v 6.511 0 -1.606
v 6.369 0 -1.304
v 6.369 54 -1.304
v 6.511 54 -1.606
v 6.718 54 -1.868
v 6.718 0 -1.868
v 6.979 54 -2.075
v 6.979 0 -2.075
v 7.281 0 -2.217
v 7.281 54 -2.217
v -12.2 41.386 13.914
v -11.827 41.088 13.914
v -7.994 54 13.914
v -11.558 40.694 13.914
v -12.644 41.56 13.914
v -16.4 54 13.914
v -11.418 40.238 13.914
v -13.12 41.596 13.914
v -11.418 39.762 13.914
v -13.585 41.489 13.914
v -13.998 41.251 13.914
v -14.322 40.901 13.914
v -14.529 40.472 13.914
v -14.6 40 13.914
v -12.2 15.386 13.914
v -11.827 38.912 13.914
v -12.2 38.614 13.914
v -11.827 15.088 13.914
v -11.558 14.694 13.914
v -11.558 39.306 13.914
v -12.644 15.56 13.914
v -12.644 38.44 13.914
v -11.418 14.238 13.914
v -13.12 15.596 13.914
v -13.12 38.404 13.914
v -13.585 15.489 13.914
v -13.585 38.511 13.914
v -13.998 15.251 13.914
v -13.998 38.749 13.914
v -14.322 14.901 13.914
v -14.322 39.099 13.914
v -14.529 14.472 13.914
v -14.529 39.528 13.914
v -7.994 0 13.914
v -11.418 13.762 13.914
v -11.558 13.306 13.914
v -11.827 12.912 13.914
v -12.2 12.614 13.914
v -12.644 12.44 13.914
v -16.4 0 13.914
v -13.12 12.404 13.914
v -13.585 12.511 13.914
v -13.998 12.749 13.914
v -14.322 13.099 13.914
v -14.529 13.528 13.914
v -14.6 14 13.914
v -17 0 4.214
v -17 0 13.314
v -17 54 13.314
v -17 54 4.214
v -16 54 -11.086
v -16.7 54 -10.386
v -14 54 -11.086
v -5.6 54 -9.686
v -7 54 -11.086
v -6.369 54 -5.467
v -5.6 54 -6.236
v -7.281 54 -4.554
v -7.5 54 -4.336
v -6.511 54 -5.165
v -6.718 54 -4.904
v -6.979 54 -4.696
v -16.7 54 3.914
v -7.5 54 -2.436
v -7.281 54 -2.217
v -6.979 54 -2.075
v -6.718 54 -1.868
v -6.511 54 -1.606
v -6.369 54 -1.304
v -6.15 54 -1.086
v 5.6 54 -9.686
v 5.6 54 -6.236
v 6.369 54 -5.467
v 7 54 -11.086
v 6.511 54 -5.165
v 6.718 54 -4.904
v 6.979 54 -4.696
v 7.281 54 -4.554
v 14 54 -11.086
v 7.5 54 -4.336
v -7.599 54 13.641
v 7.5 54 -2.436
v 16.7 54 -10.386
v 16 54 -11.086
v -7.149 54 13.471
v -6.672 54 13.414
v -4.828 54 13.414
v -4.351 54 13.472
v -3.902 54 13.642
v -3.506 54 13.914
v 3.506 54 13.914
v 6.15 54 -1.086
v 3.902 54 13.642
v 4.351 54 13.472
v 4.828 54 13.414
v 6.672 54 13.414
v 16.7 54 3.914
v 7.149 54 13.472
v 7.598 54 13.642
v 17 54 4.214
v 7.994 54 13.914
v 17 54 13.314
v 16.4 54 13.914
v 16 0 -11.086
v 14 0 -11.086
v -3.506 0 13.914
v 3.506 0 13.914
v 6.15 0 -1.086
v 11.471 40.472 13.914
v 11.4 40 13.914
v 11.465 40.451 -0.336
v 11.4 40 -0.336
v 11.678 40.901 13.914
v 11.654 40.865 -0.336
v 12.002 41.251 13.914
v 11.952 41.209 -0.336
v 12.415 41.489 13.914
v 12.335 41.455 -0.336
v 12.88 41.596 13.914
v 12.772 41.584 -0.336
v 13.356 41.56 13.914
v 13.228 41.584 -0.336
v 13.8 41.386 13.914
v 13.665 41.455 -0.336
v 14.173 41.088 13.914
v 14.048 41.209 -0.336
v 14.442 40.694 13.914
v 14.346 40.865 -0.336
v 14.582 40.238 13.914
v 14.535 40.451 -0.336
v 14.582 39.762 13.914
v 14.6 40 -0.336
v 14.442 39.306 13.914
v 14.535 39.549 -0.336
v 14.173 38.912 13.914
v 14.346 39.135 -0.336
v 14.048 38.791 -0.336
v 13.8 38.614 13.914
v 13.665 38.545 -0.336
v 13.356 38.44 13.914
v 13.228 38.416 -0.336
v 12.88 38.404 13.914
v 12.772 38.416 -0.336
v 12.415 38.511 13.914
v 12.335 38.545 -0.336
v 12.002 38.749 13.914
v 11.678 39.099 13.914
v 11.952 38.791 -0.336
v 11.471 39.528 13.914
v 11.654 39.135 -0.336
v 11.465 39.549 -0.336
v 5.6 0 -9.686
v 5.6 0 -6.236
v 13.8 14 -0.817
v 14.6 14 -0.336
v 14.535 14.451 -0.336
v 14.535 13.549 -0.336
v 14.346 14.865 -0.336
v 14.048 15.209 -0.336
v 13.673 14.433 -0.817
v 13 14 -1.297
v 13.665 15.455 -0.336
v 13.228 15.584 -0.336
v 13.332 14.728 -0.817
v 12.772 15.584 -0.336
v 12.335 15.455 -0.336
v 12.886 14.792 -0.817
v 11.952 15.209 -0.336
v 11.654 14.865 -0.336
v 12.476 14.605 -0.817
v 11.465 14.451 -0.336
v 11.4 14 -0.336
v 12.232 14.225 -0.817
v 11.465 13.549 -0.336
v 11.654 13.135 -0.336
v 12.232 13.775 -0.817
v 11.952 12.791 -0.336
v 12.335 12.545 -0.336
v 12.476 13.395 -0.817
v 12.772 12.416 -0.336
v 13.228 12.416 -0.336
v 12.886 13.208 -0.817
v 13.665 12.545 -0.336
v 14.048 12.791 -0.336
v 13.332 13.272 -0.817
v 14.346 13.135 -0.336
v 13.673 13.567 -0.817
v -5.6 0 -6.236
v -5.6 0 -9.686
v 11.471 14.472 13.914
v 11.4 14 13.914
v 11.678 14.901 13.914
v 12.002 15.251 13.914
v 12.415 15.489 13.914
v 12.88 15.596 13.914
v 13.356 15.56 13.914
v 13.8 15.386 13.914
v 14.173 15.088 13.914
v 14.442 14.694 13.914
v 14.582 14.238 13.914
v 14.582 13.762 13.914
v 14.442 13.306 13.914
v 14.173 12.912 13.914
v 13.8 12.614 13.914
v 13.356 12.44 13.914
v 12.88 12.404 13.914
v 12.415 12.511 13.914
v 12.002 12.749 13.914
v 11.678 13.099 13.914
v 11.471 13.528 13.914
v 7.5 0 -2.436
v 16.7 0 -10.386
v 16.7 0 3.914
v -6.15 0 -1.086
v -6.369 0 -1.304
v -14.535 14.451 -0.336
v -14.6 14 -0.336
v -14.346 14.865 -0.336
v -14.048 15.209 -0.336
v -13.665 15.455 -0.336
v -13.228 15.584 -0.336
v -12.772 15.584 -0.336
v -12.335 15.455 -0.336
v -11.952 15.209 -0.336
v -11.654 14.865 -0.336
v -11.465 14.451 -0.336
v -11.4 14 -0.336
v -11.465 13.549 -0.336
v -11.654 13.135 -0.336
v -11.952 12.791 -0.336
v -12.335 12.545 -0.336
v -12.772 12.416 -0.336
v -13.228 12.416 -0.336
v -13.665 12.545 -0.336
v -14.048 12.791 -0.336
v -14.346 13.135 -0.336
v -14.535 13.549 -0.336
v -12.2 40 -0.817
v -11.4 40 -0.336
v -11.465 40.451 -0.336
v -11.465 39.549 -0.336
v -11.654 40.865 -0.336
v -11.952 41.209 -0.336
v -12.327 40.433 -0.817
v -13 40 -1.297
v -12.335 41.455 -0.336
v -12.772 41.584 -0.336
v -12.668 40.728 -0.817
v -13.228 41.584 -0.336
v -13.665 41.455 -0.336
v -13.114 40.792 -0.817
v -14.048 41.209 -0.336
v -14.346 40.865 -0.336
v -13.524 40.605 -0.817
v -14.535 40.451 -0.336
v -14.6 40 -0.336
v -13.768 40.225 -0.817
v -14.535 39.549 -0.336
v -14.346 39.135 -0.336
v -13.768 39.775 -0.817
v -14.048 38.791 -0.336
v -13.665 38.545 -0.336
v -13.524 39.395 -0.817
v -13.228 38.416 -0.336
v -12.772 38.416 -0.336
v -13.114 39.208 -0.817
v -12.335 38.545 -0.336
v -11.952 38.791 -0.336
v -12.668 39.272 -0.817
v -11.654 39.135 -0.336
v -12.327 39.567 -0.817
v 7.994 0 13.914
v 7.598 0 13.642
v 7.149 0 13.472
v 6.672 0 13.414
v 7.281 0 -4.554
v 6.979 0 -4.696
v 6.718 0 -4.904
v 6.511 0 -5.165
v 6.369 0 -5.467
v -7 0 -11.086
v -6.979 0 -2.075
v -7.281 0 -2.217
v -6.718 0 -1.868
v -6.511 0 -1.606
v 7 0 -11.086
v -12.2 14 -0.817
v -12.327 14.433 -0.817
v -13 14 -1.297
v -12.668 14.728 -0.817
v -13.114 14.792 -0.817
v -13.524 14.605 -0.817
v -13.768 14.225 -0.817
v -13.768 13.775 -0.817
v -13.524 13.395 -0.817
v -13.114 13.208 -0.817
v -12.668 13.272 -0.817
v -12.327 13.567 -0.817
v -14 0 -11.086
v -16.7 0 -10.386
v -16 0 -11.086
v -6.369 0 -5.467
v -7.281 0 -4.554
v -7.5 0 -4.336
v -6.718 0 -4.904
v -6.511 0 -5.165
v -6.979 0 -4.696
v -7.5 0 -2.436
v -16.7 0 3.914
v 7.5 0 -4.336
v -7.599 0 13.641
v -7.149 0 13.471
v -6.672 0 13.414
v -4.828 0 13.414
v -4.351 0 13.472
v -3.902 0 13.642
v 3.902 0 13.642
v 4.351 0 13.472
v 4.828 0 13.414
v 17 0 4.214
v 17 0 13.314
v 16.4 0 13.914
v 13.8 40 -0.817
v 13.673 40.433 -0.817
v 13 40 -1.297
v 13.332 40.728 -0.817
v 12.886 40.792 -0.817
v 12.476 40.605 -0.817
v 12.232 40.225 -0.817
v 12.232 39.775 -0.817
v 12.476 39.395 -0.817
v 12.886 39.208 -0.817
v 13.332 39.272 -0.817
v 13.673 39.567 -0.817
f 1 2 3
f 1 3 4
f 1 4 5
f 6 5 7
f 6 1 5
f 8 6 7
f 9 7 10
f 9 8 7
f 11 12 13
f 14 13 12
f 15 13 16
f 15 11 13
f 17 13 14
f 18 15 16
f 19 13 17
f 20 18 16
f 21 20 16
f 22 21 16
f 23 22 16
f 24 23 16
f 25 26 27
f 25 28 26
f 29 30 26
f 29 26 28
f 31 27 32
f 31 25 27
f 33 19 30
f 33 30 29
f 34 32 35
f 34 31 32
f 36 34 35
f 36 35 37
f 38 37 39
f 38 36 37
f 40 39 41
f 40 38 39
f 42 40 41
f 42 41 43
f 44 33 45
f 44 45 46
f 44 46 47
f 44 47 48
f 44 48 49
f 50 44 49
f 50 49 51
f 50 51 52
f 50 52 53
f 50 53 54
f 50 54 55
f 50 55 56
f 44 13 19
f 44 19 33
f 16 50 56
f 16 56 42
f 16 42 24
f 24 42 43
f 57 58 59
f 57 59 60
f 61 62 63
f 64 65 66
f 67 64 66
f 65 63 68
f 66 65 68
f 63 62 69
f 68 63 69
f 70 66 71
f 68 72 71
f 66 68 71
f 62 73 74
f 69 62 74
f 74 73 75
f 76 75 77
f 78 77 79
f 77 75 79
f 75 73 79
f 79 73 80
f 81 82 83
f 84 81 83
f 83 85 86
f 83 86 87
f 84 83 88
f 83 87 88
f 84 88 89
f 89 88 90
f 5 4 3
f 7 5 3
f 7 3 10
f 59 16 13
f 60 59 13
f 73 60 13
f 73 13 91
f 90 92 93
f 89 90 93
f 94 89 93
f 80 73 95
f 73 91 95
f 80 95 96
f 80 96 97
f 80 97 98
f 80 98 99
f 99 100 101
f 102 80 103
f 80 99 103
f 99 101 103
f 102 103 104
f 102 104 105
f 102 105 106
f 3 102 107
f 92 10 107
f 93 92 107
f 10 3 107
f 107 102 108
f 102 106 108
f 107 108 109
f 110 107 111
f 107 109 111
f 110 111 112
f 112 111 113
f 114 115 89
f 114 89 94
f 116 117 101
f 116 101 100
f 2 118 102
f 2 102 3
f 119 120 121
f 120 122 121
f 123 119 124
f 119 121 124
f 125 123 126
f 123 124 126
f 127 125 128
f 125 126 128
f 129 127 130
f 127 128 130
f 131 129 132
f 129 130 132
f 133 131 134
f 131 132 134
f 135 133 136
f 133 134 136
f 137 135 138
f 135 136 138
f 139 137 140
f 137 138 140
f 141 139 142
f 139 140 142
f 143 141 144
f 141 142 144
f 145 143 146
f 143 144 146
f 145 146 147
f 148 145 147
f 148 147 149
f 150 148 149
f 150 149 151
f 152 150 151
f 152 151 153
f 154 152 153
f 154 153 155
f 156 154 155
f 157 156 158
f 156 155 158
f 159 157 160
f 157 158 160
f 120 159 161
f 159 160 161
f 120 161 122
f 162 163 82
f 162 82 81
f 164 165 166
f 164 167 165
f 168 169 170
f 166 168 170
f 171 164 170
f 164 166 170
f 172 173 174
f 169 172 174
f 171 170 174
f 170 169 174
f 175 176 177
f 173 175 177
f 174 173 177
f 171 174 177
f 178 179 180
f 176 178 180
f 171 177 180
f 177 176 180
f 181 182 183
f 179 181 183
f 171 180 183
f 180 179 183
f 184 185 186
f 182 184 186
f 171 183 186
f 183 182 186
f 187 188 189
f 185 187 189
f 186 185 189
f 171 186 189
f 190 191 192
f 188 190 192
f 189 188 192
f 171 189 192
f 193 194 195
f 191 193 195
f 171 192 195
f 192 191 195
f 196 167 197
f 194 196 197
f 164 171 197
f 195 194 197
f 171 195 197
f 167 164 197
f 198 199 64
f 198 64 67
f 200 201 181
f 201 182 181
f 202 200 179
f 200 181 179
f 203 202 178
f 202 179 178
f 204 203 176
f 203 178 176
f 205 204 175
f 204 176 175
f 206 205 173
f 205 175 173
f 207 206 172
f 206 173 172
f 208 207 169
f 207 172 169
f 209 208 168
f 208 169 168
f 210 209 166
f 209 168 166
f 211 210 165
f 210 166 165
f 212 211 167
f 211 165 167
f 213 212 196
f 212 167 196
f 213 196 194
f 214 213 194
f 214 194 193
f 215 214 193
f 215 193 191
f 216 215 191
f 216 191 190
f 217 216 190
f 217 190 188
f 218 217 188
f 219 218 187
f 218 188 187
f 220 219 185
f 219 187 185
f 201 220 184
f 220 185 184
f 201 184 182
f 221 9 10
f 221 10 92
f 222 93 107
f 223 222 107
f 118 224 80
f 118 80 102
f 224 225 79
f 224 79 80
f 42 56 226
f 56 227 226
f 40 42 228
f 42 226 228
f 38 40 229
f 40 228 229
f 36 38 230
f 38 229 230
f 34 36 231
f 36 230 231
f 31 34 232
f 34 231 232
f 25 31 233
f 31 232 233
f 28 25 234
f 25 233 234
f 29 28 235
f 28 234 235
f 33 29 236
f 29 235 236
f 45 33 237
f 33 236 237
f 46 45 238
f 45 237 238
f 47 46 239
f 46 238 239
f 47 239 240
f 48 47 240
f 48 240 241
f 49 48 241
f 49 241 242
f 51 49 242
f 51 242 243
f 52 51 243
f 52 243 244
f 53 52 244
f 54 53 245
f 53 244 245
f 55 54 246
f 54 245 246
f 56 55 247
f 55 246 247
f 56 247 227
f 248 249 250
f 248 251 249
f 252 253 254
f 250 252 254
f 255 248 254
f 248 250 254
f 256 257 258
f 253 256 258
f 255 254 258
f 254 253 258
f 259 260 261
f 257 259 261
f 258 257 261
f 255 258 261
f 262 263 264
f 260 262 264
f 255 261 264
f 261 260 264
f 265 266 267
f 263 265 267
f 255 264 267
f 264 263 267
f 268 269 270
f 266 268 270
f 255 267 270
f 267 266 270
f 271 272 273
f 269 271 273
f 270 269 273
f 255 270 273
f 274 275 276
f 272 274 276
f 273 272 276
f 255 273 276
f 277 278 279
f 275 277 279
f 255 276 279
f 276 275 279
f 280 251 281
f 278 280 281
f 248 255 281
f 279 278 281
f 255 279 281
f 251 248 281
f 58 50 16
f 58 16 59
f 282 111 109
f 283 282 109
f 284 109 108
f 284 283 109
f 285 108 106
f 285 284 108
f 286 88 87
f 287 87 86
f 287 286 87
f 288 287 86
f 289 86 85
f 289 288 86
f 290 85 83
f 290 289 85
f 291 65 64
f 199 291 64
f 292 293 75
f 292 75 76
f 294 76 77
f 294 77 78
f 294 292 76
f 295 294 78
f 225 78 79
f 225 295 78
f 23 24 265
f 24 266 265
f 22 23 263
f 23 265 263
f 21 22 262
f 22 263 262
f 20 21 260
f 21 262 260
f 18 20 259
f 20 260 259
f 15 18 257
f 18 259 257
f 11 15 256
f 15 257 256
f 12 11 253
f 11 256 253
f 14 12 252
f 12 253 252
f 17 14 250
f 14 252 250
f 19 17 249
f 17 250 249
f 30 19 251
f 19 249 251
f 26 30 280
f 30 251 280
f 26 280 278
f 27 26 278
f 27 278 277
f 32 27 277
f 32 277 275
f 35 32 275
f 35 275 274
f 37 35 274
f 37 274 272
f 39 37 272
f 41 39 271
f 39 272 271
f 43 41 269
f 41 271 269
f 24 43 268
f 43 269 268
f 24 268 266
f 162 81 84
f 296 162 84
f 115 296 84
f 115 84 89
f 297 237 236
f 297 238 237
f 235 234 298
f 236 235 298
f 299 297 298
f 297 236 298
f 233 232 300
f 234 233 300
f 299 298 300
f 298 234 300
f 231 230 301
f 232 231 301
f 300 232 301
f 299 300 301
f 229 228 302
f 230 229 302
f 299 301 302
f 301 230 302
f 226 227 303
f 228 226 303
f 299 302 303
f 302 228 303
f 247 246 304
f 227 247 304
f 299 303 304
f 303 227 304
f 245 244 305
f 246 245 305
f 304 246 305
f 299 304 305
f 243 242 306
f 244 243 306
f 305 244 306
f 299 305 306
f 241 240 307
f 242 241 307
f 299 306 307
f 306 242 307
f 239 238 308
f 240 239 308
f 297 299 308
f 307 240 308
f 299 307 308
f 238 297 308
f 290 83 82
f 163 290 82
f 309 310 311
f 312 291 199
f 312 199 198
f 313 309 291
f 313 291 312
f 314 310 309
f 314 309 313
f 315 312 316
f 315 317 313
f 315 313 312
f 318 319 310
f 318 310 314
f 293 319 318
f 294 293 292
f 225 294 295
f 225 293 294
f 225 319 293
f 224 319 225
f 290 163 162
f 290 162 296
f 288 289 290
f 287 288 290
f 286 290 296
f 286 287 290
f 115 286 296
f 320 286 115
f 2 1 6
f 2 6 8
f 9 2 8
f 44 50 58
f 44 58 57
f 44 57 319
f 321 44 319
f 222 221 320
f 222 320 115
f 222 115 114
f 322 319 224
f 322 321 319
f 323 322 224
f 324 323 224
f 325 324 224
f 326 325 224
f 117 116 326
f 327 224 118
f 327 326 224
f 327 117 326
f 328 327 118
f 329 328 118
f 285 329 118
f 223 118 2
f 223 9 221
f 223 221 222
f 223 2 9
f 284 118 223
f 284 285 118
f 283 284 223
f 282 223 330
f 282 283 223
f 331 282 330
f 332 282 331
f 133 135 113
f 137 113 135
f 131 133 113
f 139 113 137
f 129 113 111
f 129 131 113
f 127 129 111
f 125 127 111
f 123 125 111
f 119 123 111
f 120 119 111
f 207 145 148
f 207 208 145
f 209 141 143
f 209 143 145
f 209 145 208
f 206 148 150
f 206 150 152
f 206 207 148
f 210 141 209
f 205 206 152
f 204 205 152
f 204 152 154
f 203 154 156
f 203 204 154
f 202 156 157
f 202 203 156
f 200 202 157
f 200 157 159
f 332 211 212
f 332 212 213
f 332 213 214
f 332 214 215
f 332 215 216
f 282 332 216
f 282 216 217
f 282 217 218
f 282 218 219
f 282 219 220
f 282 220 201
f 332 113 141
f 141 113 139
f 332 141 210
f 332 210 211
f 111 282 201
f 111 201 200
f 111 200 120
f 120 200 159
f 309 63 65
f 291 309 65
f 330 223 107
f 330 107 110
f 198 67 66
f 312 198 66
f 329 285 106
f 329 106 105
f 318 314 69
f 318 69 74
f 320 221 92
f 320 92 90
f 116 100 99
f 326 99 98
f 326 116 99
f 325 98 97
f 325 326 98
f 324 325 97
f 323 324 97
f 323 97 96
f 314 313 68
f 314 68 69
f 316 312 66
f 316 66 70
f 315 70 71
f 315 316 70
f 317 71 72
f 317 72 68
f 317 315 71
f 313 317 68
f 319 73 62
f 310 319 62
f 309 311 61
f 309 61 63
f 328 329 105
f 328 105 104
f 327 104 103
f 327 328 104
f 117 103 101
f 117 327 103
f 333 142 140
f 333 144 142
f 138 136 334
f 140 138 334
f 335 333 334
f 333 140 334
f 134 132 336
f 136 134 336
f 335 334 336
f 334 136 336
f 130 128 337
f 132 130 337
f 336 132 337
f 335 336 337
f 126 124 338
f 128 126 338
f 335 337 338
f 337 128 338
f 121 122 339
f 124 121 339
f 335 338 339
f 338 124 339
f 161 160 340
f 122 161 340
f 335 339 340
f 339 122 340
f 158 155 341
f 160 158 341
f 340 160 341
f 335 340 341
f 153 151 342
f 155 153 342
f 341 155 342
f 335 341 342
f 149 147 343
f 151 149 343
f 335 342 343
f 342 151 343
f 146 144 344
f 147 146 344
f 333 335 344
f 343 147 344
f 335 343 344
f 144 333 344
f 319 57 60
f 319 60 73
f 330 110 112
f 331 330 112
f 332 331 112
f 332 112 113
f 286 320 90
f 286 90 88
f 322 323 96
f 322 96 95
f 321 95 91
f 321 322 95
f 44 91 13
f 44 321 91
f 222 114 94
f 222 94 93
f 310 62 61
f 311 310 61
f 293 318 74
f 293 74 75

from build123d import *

# Parameters (mm, degrees)
F1_DEPTH = 54
F2_DEPTH = 54
F4_D     = 3.2
F4_DEPTH = 14.25
F4_TIP   = 0.9613769904


# Not quite as in the source:
# - ends of sketch curves that miss each other by under 0.0002 mm in the source are joined


with BuildPart() as f1:
    # F0 (on Front) → F1 (new body)
    with BuildSketch(Plane.XZ):
        with BuildLine():
            Line((-15.9999975914, -11.0858444687), (-13.9999981419, -11.0858444687))
            Line((-13.9999981419, -11.0858444687), (-14.9999975913, -10.0858455697))
            Line((-14.9999975913, -10.0858455697), (-14.9999975913, 8.4141544303))
            Line((-14.9999975913, 8.4141544303), (-13.9999975913, 9.4141544303))
            Line((-13.9999975913, 9.4141544303), (14.0000024087, 9.4141544303))
            Line((14.0000024087, 9.4141544303), (15.0000024087, 8.4141544303))
            Line((15.0000024087, 8.4141544303), (15.0000024087, -10.0858455697))
            Line((15.0000024087, -10.0858455697), (14.0000024087, -11.0858455697))
            Line((14.0000024087, -11.0858455697), (16.0000024087, -11.0858444685))
            Line((16.0000024087, -11.0858444685), (16.7000024086, -10.3858444685))
            Line((16.7000024086, -10.3858444685), (16.7000024087, 3.914155003))
            Line((16.7000024087, 3.914155003), (17.0000024087, 4.2141550029))
            Line((17.0000024087, 4.2141550029), (17.0000024088, 13.3141544304))
            Line((17.0000024088, 13.3141544304), (16.4000024089, 13.9141544303))
            Line((16.4000024089, 13.9141544303), (7.9944513482, 13.9141544304))
            ThreePointArc((7.9944513482, 13.9141544304), (7.3786811713, 13.5433235007), (6.671572232, 13.4141513784))
            Line((6.671572232, 13.4141513784), (4.8284325856, 13.4141513784))
            ThreePointArc((4.8284325856, 13.4141513784), (4.1213236463, 13.5433235007), (3.5055534694, 13.9141544304))
            Line((3.5055534694, 13.9141544304), (-3.5055486519, 13.9141544303))
            ThreePointArc((-3.5055486519, 13.9141544303), (-4.1213188288, 13.5433235006), (-4.828427768, 13.4141513784))
            Line((-4.828427768, 13.4141513784), (-6.6715674144, 13.4141513784))
            ThreePointArc((-6.6715674144, 13.4141513784), (-7.3788732943, 13.5428024468), (-7.9944465306, 13.9141544304))
            Line((-7.9944465306, 13.9141544304), (-16.3999975914, 13.9141544303))
            Line((-16.3999975914, 13.9141544303), (-16.9999975913, 13.3141544304))
            Line((-16.9999975913, 13.3141544304), (-16.9999975913, 4.2141550029))
            Line((-16.9999975913, 4.2141550029), (-16.6999975912, 3.9141550028))
            Line((-16.6999975912, 3.9141550028), (-16.6999975914, -10.3858444687))
            Line((-16.6999975914, -10.3858444687), (-15.9999975914, -11.0858444687))
        make_face()
    extrude(amount=-F1_DEPTH)

    # F0 (on Front) → F2 (join)
    with BuildSketch(Plane.XZ):
        with BuildLine():
            Line((-13.9999975913, -11.0858455697), (-6.9999968681, -11.0858455697))
            Line((-6.9999968681, -11.0858455697), (-5.5999972297, -9.6858459313))
            Line((-5.5999972297, -9.6858459313), (-5.5999972297, -6.2358522996))
            Line((-5.5999972297, -6.2358522996), (-6.3686160385, -5.4672334908))
            ThreePointArc((-6.3686160385, -5.4672334908), (-6.7178259107, -4.9036746123), (-7.2813847892, -4.5544647401))
            Line((-7.2813847892, -4.5544647401), (-7.4999972297, -4.3358522996))
            Line((-7.4999972297, -4.3358522996), (-7.4999972297, -2.435839563))
            Line((-7.4999972297, -2.435839563), (-7.2813847892, -2.2172271225))
            ThreePointArc((-7.2813847892, -2.2172271225), (-6.7178259107, -1.8680172504), (-6.3686160385, -1.3044583718))
            Line((-6.3686160385, -1.3044583718), (-6.150003598, -1.0858459313))
            Line((-6.150003598, -1.0858459313), (6.1500091386, -1.0858459313))
            Line((6.1500091386, -1.0858459313), (6.3686215791, -1.3044583718))
            ThreePointArc((6.3686215791, -1.3044583718), (6.7178314512, -1.8680172504), (7.2813903298, -2.2172271225))
            Line((7.2813903298, -2.2172271225), (7.5000027703, -2.435839563))
            Line((7.5000027703, -2.435839563), (7.5000027704, -4.3358522996))
            Line((7.5000027704, -4.3358522996), (7.2813903299, -4.5544647401))
            ThreePointArc((7.2813903299, -4.5544647401), (6.7178314513, -4.9036746123), (6.3686215792, -5.4672334908))
            Line((6.3686215792, -5.4672334908), (5.6000027704, -6.2358522996))
            Line((5.6000027704, -6.2358522996), (5.6000027703, -9.6858459313))
            Line((5.6000027703, -9.6858459313), (7.0000024087, -11.0858455697))
            Line((7.0000024087, -11.0858455697), (14.0000024087, -11.0858455697))
            Line((14.0000024087, -11.0858455697), (15.0000024087, -10.0858455697))
            Line((15.0000024087, -10.0858455697), (15.0000024087, 8.4141544303))
            Line((15.0000024087, 8.4141544303), (14.0000024087, 9.4141544303))
            Line((14.0000024087, 9.4141544303), (-13.9999975913, 9.4141544303))
            Line((-13.9999975913, 9.4141544303), (-14.9999975913, 8.4141544303))
            Line((-14.9999975913, 8.4141544303), (-14.9999975913, -10.0858455697))
            Line((-14.9999975913, -10.0858455697), (-13.9999975913, -11.0858455697))
        make_face()
    extrude(amount=-F2_DEPTH)

    # F4
    with Locations(Plane.XY.offset(13.9141544304)):
        with Locations((13.0000000001, 14), (-12.9999999999, 14), (-12.9999999999, 40), (13.0000000001, 40)):
            Hole(F4_D / 2, depth=F4_DEPTH)
            with Locations((0, 0, -(F4_DEPTH + F4_TIP / 2))):  # 118° drill point
                Cone(0, F4_D / 2, F4_TIP, mode=Mode.SUBTRACT)


solid = f1.part
